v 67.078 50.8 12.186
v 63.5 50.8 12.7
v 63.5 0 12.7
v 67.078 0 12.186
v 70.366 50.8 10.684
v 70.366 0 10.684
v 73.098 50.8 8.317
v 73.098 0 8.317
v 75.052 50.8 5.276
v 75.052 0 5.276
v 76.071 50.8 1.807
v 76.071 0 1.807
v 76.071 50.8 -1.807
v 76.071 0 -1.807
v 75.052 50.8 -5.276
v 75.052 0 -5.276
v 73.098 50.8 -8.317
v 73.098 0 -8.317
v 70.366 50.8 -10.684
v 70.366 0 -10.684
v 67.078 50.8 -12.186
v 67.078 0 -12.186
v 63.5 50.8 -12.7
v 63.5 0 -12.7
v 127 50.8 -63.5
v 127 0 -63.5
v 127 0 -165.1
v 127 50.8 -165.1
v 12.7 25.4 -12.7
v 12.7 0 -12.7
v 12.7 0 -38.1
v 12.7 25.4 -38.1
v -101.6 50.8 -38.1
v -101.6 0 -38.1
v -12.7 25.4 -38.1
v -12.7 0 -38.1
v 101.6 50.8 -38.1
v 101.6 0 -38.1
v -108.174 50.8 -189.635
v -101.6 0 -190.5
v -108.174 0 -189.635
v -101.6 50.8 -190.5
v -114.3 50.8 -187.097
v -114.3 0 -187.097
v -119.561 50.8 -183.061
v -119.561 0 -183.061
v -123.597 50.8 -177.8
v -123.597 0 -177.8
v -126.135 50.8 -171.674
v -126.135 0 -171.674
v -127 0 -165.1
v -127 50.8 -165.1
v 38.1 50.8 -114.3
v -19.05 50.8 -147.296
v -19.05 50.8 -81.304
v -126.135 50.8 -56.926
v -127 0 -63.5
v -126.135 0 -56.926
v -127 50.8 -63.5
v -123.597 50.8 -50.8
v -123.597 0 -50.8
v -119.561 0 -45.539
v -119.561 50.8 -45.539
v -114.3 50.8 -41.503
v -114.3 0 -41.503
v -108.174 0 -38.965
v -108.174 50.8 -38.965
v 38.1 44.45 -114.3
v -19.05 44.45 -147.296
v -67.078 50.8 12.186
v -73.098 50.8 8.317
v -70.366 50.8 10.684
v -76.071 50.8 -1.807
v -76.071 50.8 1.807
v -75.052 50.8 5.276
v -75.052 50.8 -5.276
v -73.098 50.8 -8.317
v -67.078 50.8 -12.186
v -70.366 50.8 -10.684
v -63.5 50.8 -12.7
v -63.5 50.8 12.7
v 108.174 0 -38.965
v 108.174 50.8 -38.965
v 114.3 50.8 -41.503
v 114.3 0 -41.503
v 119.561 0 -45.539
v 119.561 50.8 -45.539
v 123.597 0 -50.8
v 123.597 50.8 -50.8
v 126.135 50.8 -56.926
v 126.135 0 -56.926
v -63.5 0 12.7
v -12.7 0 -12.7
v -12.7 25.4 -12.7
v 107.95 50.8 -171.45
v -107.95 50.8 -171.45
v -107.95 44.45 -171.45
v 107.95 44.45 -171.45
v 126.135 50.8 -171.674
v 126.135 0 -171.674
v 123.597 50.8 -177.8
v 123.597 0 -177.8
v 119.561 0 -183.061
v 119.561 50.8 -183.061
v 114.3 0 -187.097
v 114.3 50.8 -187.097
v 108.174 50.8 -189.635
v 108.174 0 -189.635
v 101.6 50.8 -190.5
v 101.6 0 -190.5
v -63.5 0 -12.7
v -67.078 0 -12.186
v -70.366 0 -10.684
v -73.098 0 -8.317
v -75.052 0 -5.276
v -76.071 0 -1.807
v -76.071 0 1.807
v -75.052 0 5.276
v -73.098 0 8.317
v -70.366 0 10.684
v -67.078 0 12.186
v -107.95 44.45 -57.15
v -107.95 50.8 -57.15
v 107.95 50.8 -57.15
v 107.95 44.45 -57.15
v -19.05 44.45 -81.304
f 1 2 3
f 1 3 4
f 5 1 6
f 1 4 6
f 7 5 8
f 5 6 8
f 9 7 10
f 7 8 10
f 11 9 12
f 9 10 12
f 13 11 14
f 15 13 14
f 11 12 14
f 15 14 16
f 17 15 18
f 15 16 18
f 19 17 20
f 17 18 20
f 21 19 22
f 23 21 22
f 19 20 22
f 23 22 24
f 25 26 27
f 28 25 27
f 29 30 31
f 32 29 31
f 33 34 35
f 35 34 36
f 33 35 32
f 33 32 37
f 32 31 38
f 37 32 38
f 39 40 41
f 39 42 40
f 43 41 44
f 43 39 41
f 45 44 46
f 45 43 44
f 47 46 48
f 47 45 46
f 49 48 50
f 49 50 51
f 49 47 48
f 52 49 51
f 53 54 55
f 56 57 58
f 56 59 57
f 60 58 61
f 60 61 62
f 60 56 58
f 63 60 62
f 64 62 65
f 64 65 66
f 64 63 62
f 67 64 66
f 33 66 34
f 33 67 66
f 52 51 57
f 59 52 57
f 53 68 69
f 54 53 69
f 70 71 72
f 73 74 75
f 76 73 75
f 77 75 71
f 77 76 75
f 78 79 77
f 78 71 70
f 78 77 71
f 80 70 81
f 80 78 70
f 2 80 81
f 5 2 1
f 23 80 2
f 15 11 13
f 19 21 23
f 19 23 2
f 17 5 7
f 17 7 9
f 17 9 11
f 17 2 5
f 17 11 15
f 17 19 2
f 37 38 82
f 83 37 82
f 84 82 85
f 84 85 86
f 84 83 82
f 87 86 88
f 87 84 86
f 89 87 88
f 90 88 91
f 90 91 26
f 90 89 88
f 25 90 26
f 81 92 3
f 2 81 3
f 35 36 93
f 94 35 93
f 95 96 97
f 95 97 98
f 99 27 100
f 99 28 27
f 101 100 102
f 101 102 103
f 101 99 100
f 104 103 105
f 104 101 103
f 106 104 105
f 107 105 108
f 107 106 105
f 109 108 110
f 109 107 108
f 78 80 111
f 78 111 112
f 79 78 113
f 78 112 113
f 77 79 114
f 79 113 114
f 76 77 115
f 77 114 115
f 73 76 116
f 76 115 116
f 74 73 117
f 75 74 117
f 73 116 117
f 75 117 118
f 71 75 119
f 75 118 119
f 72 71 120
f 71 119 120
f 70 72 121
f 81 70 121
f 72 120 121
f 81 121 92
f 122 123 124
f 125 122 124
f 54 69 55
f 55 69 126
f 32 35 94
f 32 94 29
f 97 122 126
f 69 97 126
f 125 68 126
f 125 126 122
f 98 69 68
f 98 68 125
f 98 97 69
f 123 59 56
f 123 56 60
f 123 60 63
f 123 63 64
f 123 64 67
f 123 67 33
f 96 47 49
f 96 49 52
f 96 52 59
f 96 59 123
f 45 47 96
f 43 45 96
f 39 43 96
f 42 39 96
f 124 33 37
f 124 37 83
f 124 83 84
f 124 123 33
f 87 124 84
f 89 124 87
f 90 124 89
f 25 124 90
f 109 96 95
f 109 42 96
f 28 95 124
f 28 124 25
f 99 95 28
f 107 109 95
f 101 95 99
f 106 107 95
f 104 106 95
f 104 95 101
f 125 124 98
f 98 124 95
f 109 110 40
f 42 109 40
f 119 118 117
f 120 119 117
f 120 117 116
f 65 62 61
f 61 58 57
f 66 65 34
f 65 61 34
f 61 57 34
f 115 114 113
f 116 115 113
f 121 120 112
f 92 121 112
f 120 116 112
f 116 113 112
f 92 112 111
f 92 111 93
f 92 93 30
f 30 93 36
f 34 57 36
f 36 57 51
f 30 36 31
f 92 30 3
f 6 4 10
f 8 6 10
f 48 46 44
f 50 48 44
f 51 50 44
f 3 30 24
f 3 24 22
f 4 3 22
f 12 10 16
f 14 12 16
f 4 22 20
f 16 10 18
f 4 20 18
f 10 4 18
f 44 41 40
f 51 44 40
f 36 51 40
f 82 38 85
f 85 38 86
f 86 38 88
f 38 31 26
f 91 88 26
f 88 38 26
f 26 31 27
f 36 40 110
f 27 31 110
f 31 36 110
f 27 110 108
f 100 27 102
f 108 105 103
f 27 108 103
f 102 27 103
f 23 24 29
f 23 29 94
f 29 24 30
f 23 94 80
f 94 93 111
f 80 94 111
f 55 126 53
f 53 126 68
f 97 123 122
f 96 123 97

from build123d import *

# Parameters (mm, degrees)
BOSS_EXTRUDE1_DEPTH = 50.8
FILLET1_R           = 25.4
SKETCH4_W           = 215.9
SKETCH4_H           = 114.3
CUT_EXTRUDE1_DEPTH  = 6.35
BOSS_EXTRUDE2_DEPTH = 6.35
SKETCH6_W           = 25.4
SKETCH6_H           = 25.4
CUT_EXTRUDE2_DEPTH  = 25.4


with BuildPart() as part:
    # Sketch2 → Boss-Extrude1 (new body)
    with BuildSketch(Plane(origin=(0, 0, 0), x_dir=(1, 0, 0), z_dir=(0, 1, 0))):
        with BuildLine():
            Line((-12.7, 12.7), (-63.5, 12.7))
            ThreePointArc((-63.5, 12.7), (-76.2, 0), (-63.5, -12.7))
            Line((-63.5, -12.7), (63.5, -12.7))
            ThreePointArc((63.5, -12.7), (76.2, 0), (63.5, 12.7))
            Line((63.5, 12.7), (12.7, 12.7))
            Line((12.7, 12.7), (12.7, 38.1))
            Line((12.7, 38.1), (127, 38.1))
            Line((127, 38.1), (127, 190.5))
            Line((127, 190.5), (-127, 190.5))
            Line((-127, 190.5), (-127, 38.1))
            Line((-127, 38.1), (-12.7, 38.1))
            Line((-12.7, 38.1), (-12.7, 12.7))
        make_face()
    extrude(amount=BOSS_EXTRUDE1_DEPTH)

    # Fillet1
    fillet1_edges = [part.edges().sort_by_distance(p)[0] for p in [
        (127, 25.4, -38.1),
        (-127, 25.4, -38.1),
        (-127, 25.4, -190.5),
        (127, 25.4, -190.5),
    ]]
    fillet(fillet1_edges, radius=FILLET1_R)

    # Sketch4 → Cut-Extrude1 (cut)
    with BuildSketch(Plane(origin=(0, 50.8, 0), x_dir=(1, 0, 0), z_dir=(0, 1, 0))):
        with Locations((0, 114.3)):
            Rectangle(SKETCH4_W, SKETCH4_H)
    extrude(amount=-CUT_EXTRUDE1_DEPTH, mode=Mode.SUBTRACT)

    # Sketch5 → Boss-Extrude2 (add)
    with BuildSketch(Plane(origin=(0, 44.45, 0), x_dir=(1, 0, 0), z_dir=(0, 1, 0))):
        Polygon((38.1, 114.3), (-19.05, 147.295567884), (-19.05, 81.304432116), align=None)
    extrude(amount=BOSS_EXTRUDE2_DEPTH)

    # Sketch6 → Cut-Extrude2 (cut)
    with BuildSketch(Plane(origin=(0, 50.8, 0), x_dir=(1, 0, 0), z_dir=(0, 1, 0))):
        with Locations((0, 25.4)):
            Rectangle(SKETCH6_W, SKETCH6_H)
    extrude(amount=-CUT_EXTRUDE2_DEPTH, mode=Mode.SUBTRACT)


solid = part.part
